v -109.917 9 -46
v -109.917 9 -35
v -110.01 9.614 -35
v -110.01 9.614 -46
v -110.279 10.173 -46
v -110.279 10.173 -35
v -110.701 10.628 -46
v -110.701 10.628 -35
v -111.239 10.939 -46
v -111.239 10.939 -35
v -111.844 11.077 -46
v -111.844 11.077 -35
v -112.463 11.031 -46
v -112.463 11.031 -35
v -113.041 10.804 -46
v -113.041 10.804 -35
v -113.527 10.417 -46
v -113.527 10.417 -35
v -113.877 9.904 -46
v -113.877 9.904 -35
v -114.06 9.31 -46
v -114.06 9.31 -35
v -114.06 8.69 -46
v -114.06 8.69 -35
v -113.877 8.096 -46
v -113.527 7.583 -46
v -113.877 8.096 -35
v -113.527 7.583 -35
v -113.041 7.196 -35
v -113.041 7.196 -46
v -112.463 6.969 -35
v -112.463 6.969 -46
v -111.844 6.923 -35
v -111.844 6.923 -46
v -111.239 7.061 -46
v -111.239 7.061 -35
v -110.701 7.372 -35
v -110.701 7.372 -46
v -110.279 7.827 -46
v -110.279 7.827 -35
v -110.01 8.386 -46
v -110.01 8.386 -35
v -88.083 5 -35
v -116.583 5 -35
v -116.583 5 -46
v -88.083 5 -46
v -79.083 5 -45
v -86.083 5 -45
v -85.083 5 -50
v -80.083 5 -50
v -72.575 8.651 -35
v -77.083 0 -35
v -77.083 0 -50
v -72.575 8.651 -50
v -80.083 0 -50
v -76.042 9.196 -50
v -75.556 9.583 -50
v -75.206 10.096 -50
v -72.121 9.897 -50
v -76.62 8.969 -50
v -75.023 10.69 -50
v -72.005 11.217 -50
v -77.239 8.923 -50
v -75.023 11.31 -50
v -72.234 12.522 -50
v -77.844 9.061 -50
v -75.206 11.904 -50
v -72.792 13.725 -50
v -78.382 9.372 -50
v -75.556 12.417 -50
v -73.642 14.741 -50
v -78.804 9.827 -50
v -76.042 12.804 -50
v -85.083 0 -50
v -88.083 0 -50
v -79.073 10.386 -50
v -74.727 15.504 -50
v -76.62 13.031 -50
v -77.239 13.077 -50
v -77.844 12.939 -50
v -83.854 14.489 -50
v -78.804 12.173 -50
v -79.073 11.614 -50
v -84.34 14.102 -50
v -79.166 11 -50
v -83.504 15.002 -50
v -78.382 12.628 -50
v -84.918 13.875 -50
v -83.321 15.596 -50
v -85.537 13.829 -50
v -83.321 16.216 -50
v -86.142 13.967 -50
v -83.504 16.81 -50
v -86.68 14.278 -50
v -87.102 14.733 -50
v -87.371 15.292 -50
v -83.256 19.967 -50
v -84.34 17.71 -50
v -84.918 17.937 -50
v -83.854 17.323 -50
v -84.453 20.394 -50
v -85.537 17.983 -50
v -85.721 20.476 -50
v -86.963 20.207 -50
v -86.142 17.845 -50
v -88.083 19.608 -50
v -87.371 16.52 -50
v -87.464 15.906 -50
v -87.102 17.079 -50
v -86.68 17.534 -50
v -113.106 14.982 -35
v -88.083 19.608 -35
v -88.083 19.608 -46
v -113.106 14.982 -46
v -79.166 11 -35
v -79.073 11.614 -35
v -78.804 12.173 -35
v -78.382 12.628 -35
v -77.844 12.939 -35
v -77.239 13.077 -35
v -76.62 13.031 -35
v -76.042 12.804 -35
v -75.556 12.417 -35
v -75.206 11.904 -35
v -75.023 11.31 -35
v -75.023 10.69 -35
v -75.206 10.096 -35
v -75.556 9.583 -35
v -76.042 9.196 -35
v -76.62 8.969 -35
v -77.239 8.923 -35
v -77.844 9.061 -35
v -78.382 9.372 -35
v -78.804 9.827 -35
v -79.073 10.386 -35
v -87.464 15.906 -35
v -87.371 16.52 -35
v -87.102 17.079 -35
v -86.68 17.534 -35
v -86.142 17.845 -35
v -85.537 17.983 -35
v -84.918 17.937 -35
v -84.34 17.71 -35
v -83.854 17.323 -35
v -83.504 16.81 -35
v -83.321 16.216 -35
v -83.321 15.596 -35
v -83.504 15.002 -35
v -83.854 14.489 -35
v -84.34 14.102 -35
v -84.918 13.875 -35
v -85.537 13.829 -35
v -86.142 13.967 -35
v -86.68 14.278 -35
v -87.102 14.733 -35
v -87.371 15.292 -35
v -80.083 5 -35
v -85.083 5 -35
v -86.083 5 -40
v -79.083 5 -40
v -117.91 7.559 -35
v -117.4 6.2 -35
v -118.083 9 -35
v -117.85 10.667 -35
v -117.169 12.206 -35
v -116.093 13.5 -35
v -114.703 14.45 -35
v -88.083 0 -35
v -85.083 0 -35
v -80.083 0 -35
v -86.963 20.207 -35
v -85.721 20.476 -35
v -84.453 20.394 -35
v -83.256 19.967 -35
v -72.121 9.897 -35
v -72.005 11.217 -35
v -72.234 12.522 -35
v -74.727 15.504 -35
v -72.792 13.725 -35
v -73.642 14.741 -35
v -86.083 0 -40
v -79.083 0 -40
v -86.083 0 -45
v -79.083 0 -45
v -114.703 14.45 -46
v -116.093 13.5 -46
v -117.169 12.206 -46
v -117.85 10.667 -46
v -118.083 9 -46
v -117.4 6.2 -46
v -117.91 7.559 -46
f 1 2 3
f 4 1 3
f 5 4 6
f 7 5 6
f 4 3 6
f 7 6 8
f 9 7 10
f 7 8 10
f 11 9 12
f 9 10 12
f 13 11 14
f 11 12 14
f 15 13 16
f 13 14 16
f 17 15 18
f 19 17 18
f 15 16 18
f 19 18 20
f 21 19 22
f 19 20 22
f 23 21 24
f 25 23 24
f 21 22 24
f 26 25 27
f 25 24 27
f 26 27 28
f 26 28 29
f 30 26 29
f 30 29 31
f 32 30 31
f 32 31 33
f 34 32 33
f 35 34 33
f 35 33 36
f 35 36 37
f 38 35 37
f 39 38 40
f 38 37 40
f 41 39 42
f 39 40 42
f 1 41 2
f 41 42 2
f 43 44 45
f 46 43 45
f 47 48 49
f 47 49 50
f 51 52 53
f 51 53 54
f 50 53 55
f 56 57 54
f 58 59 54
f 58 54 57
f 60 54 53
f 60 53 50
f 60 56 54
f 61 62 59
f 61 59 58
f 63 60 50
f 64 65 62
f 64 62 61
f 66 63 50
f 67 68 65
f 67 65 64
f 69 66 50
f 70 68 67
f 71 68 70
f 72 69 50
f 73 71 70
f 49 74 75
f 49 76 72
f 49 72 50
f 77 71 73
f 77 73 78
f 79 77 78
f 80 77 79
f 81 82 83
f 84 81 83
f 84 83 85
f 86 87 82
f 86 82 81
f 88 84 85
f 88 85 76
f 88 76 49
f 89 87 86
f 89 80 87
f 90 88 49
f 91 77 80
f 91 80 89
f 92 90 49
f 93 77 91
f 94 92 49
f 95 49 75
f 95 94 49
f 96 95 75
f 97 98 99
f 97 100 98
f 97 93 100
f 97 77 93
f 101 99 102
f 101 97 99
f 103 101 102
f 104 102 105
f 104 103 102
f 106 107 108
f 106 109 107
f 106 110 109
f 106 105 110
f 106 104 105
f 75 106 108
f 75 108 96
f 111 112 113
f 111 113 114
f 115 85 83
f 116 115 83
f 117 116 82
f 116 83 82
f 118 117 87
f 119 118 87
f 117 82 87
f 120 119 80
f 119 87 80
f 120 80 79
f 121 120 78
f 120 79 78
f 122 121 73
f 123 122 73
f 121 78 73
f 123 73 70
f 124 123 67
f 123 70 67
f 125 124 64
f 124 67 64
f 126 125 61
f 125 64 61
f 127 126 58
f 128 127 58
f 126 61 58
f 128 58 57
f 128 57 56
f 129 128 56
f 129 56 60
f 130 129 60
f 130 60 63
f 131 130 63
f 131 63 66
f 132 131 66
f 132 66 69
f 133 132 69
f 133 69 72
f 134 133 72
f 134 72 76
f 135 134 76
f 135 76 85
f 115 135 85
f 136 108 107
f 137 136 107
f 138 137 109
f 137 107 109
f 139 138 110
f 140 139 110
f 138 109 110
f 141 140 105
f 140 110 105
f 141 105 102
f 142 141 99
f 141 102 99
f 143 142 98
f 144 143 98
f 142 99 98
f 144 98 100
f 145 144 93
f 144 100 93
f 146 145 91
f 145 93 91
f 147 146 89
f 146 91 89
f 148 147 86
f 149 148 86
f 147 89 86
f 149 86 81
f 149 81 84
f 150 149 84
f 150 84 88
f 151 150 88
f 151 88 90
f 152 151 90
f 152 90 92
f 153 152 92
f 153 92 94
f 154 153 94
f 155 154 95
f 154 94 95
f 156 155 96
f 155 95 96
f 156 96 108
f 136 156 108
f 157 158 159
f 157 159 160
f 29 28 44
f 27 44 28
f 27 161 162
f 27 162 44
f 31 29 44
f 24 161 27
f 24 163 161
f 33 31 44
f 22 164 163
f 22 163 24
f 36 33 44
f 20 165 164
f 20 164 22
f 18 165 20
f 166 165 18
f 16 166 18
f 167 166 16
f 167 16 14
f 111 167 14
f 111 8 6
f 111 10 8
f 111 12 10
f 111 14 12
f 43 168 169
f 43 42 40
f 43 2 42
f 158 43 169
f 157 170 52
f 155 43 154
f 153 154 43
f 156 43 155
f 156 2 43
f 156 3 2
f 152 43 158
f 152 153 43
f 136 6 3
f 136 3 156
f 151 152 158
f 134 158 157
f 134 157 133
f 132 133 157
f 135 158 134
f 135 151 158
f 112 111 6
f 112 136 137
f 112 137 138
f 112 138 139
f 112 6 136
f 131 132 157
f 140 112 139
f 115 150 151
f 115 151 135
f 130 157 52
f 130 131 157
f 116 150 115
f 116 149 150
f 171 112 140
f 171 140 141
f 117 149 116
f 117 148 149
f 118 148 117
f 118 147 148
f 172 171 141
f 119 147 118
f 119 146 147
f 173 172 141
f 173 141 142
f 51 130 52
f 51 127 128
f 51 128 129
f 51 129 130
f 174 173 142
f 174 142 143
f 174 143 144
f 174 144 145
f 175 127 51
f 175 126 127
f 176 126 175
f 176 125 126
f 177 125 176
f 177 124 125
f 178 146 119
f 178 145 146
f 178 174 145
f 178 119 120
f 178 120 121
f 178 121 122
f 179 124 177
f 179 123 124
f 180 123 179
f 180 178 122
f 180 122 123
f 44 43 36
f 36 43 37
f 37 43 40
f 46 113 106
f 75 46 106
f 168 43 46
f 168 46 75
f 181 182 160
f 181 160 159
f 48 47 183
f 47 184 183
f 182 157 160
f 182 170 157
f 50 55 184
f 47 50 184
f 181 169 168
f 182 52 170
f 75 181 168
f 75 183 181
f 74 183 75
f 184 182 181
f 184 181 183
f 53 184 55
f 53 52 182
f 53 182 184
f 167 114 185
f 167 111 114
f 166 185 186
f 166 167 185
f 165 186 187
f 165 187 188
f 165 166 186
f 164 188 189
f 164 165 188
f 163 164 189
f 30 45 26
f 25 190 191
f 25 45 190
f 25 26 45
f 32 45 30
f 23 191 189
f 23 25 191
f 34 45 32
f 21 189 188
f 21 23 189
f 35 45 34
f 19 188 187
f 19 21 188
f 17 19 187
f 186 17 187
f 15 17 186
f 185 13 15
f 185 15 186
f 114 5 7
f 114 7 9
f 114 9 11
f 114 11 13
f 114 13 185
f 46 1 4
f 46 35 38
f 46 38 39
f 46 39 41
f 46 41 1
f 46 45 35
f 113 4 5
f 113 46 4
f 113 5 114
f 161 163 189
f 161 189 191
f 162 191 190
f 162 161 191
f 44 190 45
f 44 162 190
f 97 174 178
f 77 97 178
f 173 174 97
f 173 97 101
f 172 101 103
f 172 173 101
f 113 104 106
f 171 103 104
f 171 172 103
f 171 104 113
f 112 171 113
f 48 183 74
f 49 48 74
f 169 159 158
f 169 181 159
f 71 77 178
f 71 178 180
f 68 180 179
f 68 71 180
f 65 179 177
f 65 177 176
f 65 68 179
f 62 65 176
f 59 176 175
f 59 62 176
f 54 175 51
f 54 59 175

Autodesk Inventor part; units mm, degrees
ref_plane "YZ Plane" through (0, 0, 0) normal (1, 0, 0) x (0, 1, 0)
ref_plane "XZ Plane" through (0, 0, 0) normal (0, 1, 0) x (-1, 0, 0)
ref_plane "XY Plane" through (0, 0, 0) normal (0, 0, 1) x (1, 0, 0)
sketch "Sketch1" plane through (0, 0, 0) normal (0, 1, 0) x (-1, 0, 0)
  line L0 (0, 0) -> (0, -35)
  line L1 (0, -35) -> (37, -35)
  line L2 (37, -35) -> (37, -55)
  line L3 (37, -55) -> (48, -55)
  line L4 (48, -55) -> (48, 0)
  line L5 (48, 0) -> (22, 0)
  line L6 (22, 0) -> (22, 0)
  line L7 (22, 0) -> (0, 0)
  dimension "d0" = 35
  dimension "d1" = 37
  dimension "d2" = 20
  dimension "d3" = 11
  dimension "d4" = 55
  dimension "d5" = 26
  dimension "d6" = 0
extrude "Extrusion1" add sketch "Sketch1" along normal blind 50
shell "Shell1" thickness 5 removed faces 3 at (-48, 16.6667, -36.6667) at (-19.6667, 0, -23.3333) at (-19.6667, 50, -23.3333)
sketch "Sketch2" plane through (0, 0, 0) normal (1, 0, 0) x (0, 0, -1)
  line L0 (5, 0) -> (30, 0) projected
  line L1 (5, 0) -> (19, 0)
  line L2 (19, 0) -> (19, 17)
  line L3 (19, 17) -> (5, 17)
  line L4 (5, 17) -> (5, 0)
  point P0 (0, 0)
  dimension "d10" = 17
  dimension "d11" = 0
  dimension "d12" = 11
extrude "Extrusion2" cut sketch "Sketch2" against normal blind 10
sketch "Sketch3" plane through (-48, 0, -55) normal (-1, 0, 0) x (0, 0, 1)
  line L0 (0, 0) -> (0, 50) projected
  line L1 (5, 50) -> (25, 50) projected
  line L2 (0, 0) -> (5, 0)
  line L3 (5, 0) -> (5, 50)
  line L4 (5, 50) -> (0, 50)
  line L5 (0, 50) -> (0, 0)
  point P0 (55, 0)
extrude "Extrusion3" add sketch "Sketch3" along normal blind 15
sketch "Sketch4" plane through (-48, 0, 0) normal (-1, 0, 0) x (0, 0, 1)
  line L0 (-5, 0) -> (0, 0) projected
  line L1 (-5, 0) -> (-5, 50) projected
  line L2 (0, 0) -> (-5, 0)
  line L3 (-5, 0) -> (-5, 50)
  line L4 (-5, 50) -> (0, 50)
  line L5 (0, 50) -> (0, 0)
  point P0 (0, 0)
extrude "Extrusion4" add sketch "Sketch4" along normal blind 15
sketch "Sketch5" plane through (0, 17, -5) normal (0, 0, -1) x (-1, 0, 0)
  circle A0 centre (11.5, -8.5) radius 2.0828
  line L0 (63, -17) -> (0, -17) projected
  line L1 (0, -17) -> (0, 0) projected
  dimension "d19" = 4.1656
  dimension "d20" = 8.5
  dimension "d21" = 11.5
extrude "Extrusion5" cut sketch "Sketch5" against normal blind 15
sketch "Sketch6" plane through (0, 17, -5) normal (0, 0, -1) x (-1, 0, 0)
  circle A0 centre (28.505, 18.46) radius 2.0828
  line L0 (63, -17) -> (0, -17) projected
  line L1 (5, 0) -> (5, 33) projected
  dimension "d24" = 4.1656
  dimension "d25" = 35.46
  dimension "d26" = 23.505
extrude "Extrusion6" cut sketch "Sketch6" against normal blind 15
sketch "Sketch7" plane through (0, 17, -5) normal (0, 0, -1) x (-1, 0, 0)
  circle A0 centre (58.5, 19) radius 2.0828
  line L0 (63, 33) -> (63, -17) projected
  line L1 (5, 33) -> (63, 33) projected
  point P0 (0, -17)
  dimension "d29" = 4.1656
  dimension "d30" = 4.5
  dimension "d31" = 14
extrude "Extrusion7" cut sketch "Sketch7" against normal blind 15
sketch "Sketch13" plane through (0, 0, -35) normal (0, 0, -1) x (-1, 0, 0)
  circle A0 centre (11.5, 8.5) radius 2.0828
  line L0 (0, 0) -> (37, 0) projected
  line L1 (0, 0) -> (0, 50) projected
  dimension "d41" = 4.1656
  dimension "d42" = 8.5
  dimension "d43" = 11.5
extrude "Extrusion9" cut sketch "Sketch13" against normal blind 15
sketch "Sketch14" plane through (-37, 0, -55) normal (0, 0, -1) x (-1, 0, 0)
  circle A0 centre (-8.495, 35.46) radius 2.0828
  line L0 (-37, 0) -> (-37, 50) projected
  line L1 (0, 0) -> (26, 0) projected
  dimension "d46" = 4.1656
  dimension "d47" = 28.505
  dimension "d48" = 35.46
extrude "Extrusion10" cut sketch "Sketch14" against normal blind 15
sketch "Sketch15" plane through (-37, 0, -55) normal (0, 0, -1) x (-1, 0, 0)
  circle A0 centre (21.5, 36) radius 2.0828
  line L0 (0, 0) -> (26, 0) projected
  line L1 (26, 50) -> (26, 0) projected
  point P0 (-37, 0)
  dimension "d51" = 4.1656
  dimension "d52" = 36
  dimension "d53" = 4.5
extrude "Extrusion11" cut sketch "Sketch15" against normal blind 15
sketch "Sketch16" plane through (-42, 0, -30) normal (-1, 0, 0) x (0, 0, 1)
  line L0 (0, 0) -> (-5, 0)
  line L1 (-5, 0) -> (-5, 50)
  line L2 (-5, 50) -> (0, 50)
  line L3 (0, 50) -> (0, 0)
  point P0 (30, 0)
  dimension "d56" = 5
  dimension "d57" = 50
extrude "Extrusion12" add sketch "Sketch16" along normal blind 21
sketch "Sketch17" plane through (-5, 0, -30) normal (0, 0, 1) x (1, 0, 0)
  circle A0 centre (-23.505, 35.46) radius 2.0828
  line L0 (0, 0) -> (0, 50) projected
  line L1 (0, 0) -> (-58, 0) projected
  point P0 (5, 0)
  dimension "d60" = 4.1656
  dimension "d61" = 23.505
  dimension "d62" = 35.46
extrude "Extrusion13" cut sketch "Sketch17" against normal blind 10
sketch "Sketch18" plane through (-42, 0, -35) normal (0, 0, -1) x (-1, 0, 0)
  circle A0 centre (16.5, 36) radius 2.0828
  line L0 (21, 50) -> (21, 0) projected
  line L1 (0, 0) -> (21, 0) projected
  point P0 (-42, 0)
  dimension "d65" = 4.1656
  dimension "d67" = 36
  dimension "d70" = 4.5
extrude "Extrusion14" cut sketch "Sketch18" against normal blind 10
sketch "Sketch20" plane through (-63, 0, 0) normal (-1, 0, 0) x (0, 0, 1)
  line L0 (0, 0) -> (-5, 0) projected
  line L1 (-5, 17) -> (-5, 50) projected
  line L2 (0, 0) -> (-5, 0)
  line L3 (-5, 0) -> (-5, 50)
  line L4 (-5, 50) -> (0, 50)
  line L5 (0, 50) -> (0, 0)
extrude "Extrusion15" add sketch "Sketch20" along normal blind 2.583
sketch "Sketch21" plane through (-63, 0, -30) normal (-1, 0, 0) x (0, 0, 1)
  line L0 (-20, 50) -> (-5, 50) projected
  line L1 (11, 0) -> (0, 0) projected
  line L2 (-5, 50) -> (0, 50)
  line L3 (0, 50) -> (0, 0)
  line L4 (0, 0) -> (-5, 0)
  line L5 (-5, 0) -> (-5, 50)
  point P0 (30, 0)
extrude "Extrusion16" add sketch "Sketch21" along normal blind 2.583
sketch "Sketch22" plane through (-63, 0, -55) normal (-1, 0, 0) x (0, 0, 1)
  line L0 (0, 0) -> (0, 50) projected
  line L1 (5, 0) -> (5, 50) projected
  line L2 (0, 50) -> (5, 50)
  line L3 (5, 50) -> (5, 0)
  line L4 (5, 0) -> (0, 0)
  line L5 (0, 0) -> (0, 50)
  point P0 (55, 0)
extrude "Extrusion17" add sketch "Sketch22" along normal blind 2.583
sketch "Sketch23" plane through (0, 0, 0) normal (0, 0, 1) x (1, 0, 0)
  line L0 (0, 50) -> (-37, 50) projected
  line L1 (-65.583, 50) -> (-65.583, 0) projected
  line L2 (0, 50) -> (-65.583, 50)
  line L3 (-65.583, 50) -> (-65.583, 43.083)
  line L4 (-65.583, 43.083) -> (0, 43.083)
  line L5 (0, 43.083) -> (0, 50)
  point P0 (0, 0)
  dimension "d77" = 6.917
extrude "Extrusion18" cut sketch "Sketch23" against normal blind 100
sketch "Sketch24" plane through (0, 0, -35) normal (0, 0, -1) x (-1, 0, 0)
  line L0 (0, 0) -> (65.583, 0) projected
  line L1 (31.0052, 0) -> (26.0052, 0)
  line L2 (26.0052, 5) -> (31.0052, 5)
  circle A0 centre (28.505, 35.46) radius 2.0828 projected
  line L3 (26.0052, 5) -> (25.0052, 5)
  line L4 (25.0052, 5) -> (26.0052, 0)
  line L5 (31.0052, 5) -> (32.0052, 5)
  line L6 (32.0052, 5) -> (31.0052, 0)
  dimension "d80" = 5
  dimension "d81" = 5
  dimension "d83" = 1
  dimension "d84" = 1
extrude "Extrusion19" cut sketch "Sketch24" against normal blind 100 contours L4 L3 L2 L5 L6 L0
sketch "Sketch25" plane through (-65.583, 0, -55) normal (-1, 0, 0) x (0, 0, 1)
  line L0 (20, 0) -> (0, 0) projected
  line L1 (0, 43.083) -> (20, 43.083) projected
  line L2 (0, 0) -> (5, 0)
  line L3 (5, 0) -> (5, 43.083)
  line L4 (5, 43.083) -> (0, 43.083)
  line L5 (0, 43.083) -> (0, 0)
  point P0 (55, 0)
  dimension "d87" = 5
extrude "Extrusion20" add sketch "Sketch25" along normal blind 22.5
sketch "Sketch28" plane through (-65.583, 0, -30) normal (-1, 0, 0) x (0, 0, 1)
  line L0 (0, 0) -> (-5, 0) projected
  line L1 (-5, 0) -> (-5, 43.083) projected
  line L2 (0, 0) -> (-5, 0)
  line L3 (-5, 0) -> (-5, 43.083)
  line L4 (-5, 43.083) -> (0, 43.083)
  line L5 (0, 43.083) -> (0, 0)
  point P0 (30, 0)
extrude "Extrusion23" add sketch "Sketch28" along normal blind 22.5
sketch "Sketch26" plane through (-37, 0, -55) normal (0, 0, -1) x (-1, 0, 0)
  circle A0 centre (45.232, 36.922) radius 2.0828
  line L0 (51.083, 43.083) -> (51.083, 0) projected
  line L1 (51.083, 43.083) -> (0, 43.083) projected
  point P0 (-37, 0)
  dimension "d90" = 4.1656
  dimension "d91" = 5.851
  dimension "d92" = 6.161
extrude "Extrusion21" cut sketch "Sketch26" against normal blind 25
sketch "Sketch27" plane through (-37, 0, -55) normal (0, 0, -1) x (-1, 0, 0)
  circle A0 centre (48.381, 15.906) radius 2.0828
  line L0 (51.083, 43.083) -> (51.083, 0) projected
  line L1 (0, 0) -> (51.083, 0) projected
  point P0 (-37, 0)
  dimension "d95" = 4.1656
  dimension "d96" = 2.702
  dimension "d97" = 15.906
extrude "Extrusion22" cut sketch "Sketch27" against normal blind 25
sketch "Sketch29" plane through (-42, 0, -35) normal (0, 0, -1) x (-1, 0, 0)
  circle A0 centre (43.381, 15.906) radius 2.0828 projected
  arc A1 (46.083, 19.6075) -> (46.083, 12.2045) centre (43.381, 15.906) ccw
  line L0 (46.083, 43.083) -> (46.083, 0) projected
  line L1 (46.083, 19.6075) -> (46.083, 12.2045)
  point P0 (-42, 0)
  dimension "d102" = 2.5
extrude "Extrusion24" add sketch "Sketch29" along normal up to next
sketch "Sketch30" plane through (-88.083, 0, -55) normal (-1, 0, 0) x (0, 0, 1)
  line L0 (9, 19.6075) -> (20, 19.6075)
  line L1 (20, 19.6075) -> (20, 5)
  line L2 (20, 5) -> (9, 5)
  line L3 (9, 5) -> (9, 19.6075)
  line L4 (0, 43.083) -> (0, 0) projected
  line L5 (25, 0) -> (25, 43.083) projected
  line L6 (0, 0) -> (5, 0) projected
  line L7 (20, 19.6075) -> (5, 19.6075) projected
  point P0 (55, 0)
  dimension "d105" = 9
  dimension "d106" = 5
  dimension "d107" = 5
  dimension "d108" = 0
extrude "Extrusion25" add sketch "Sketch30" along normal blind 30
sketch "Sketch31" plane through (-88.083, 5, -35) normal (0, 0, 1) x (1, 0, 0)
  circle A0 centre (-23.917, 4) radius 2.0828
  line L0 (-30, 0) -> (-30, 14.6075) projected
  line L1 (0, 0) -> (-30, 0) projected
  point P0 (88.083, -5)
  dimension "d111" = 4.1656
  dimension "d112" = 6.083
  dimension "d113" = 4
extrude "Extrusion26" cut sketch "Sketch31" against normal blind 30
sketch "Sketch33" plane through (-88.083, 5, -35) normal (0, 0, 1) x (1, 0, 0)
  circle A0 centre (-23.917, 4) radius 2.0828 projected
  arc A1 (-25.0228, 9.9816) -> (-30, 4) centre (-23.917, 4) ccw
  line L0 (-30, 14.6075) -> (-30, 0) projected
  line L1 (-30, 0) -> (-30, 14.6075) projected
  line L2 (0, 14.6075) -> (-30, 14.6075) projected
  line L3 (-30, 4) -> (-30, 14.6075)
  line L4 (0, 14.6075) -> (-30, 14.6075) projected
  line L5 (-30, 14.6075) -> (0, 14.6075)
  line L6 (0, 14.6075) -> (-25.0228, 9.9816)
  point P0 (88.083, -5)
extrude "Extrusion27" cut sketch "Sketch33" against normal blind 30 contours A1 L0 L2 L6
sketch "Sketch34" plane through (-118.083, 5, -35) normal (0, 0, 1) x (1, 0, 0)
  circle A0 centre (6.083, 4) radius 2.0828 projected
  line L0 (0, 0) -> (0, 4) projected
  arc A1 (0, 4) -> (1.5001, 0) centre (6.083, 4) ccw
  line L1 (30, 0) -> (0, 0) projected
  line L2 (1.5001, 0) -> (0, 0)
  arc A2 (4.9772, 9.9816) -> (0, 4) centre (6.083, 4) ccw projected
  line L3 (0, 0) -> (0, 4)
  point P0 (118.083, -5)
extrude "Extrusion28" cut sketch "Sketch34" against normal blind 30 contours L0 A1 L1
sketch "Sketch35" plane through (-88.083, 5, -46) normal (0, -1, 0) x (1, 0, 0)
  line L0 (0, 0) -> (-28.4999, 0) projected
  line L1 (46.083, 11) -> (0, 11) projected
  line L2 (0, 11) -> (11, 11)
  line L3 (11, 11) -> (11, -4)
  line L4 (11, -4) -> (0, -4)
  line L5 (0, -4) -> (0, 11)
  point P0 (88.083, 46)
  dimension "d130" = 11
  dimension "d131" = 15
  dimension "d132" = 0
  dimension "d133" = 0
extrude "Extrusion29" add sketch "Sketch35" against normal blind 8 and the other way blind 5
sketch "Sketch39" plane through (0, 0, 0) normal (1, 0, 0) x (0, 0, -1)
  line L0 (0, 0) -> (5, 0) projected
  line L1 (35, 43.083) -> (0, 43.083) projected
  line L2 (0, 0) -> (35, 0)
  line L3 (35, 0) -> (35, 43.083)
  line L4 (35, 43.083) -> (0, 43.083)
  line L5 (0, 43.083) -> (0, 0)
extrude "Extrusion30" cut sketch "Sketch39" against normal blind 190
sketch "Sketch40" plane through (-37, 0, -55) normal (0, 0, -1) x (-1, 0, 0)
  line L0 (29.4244, -3.1435) -> (-8.7081, -3.1435)
  line L1 (-8.7081, -3.1435) -> (-8.7081, 47.1531)
  line L2 (-8.7081, 47.1531) -> (29.4244, 47.1531)
  line L3 (29.4244, 47.1531) -> (29.4244, -3.1435)
  point P0 (-37, 0)
extrude "Extrusion31" cut sketch "Sketch40" against normal blind 50
sketch "Sketch41" plane through (-66.4244, 0, -55) normal (1, 0, 0) x (0, 0, -1)
  line L0 (0, 0) -> (-5, 0) projected
  line L1 (-5, 0) -> (13.4745, 0)
  line L2 (13.4745, 0) -> (13.4745, 44.4196)
  line L3 (13.4745, 44.4196) -> (-5, 44.4196)
  line L4 (-5, 44.4196) -> (-5, 0)
  point P0 (-55, 0)
extrude "Extrusion32" cut sketch "Sketch41" against normal blind 50
sketch "Sketch42" plane through (-88.083, 0, -35) normal (0, 0, 1) x (1, 0, 0)
  line L0 (11, 13) -> (6.2456, 13) projected
  line L1 (11, 13) -> (6.2456, 18.812)
  arc A0 (6.2456, 13) -> (0, 19.6075) centre (2.702, 15.906) ccw projected
  line L2 (6.2456, 13) -> (6.2456, 18.812)
  line L3 (6.2456, 13) -> (11, 13)
  point P0 (88.083, 0)
extrude "Extrusion33" add sketch "Sketch42" against normal blind 15
sketch "Sketch43" plane through (0, 0, 0) normal (0, -1, 0) x (1, 0, 0)
  line L0 (-88.083, -50) -> (-77.083, -50) projected
  line L1 (-80.083, -50) -> (-79.083, -45)
  line L2 (-79.083, -45) -> (-86.083, -45)
  line L3 (-86.083, -45) -> (-85.083, -50)
  line L4 (-80.083, -50) -> (-85.083, -50)
  line L5 (-77.083, -50) -> (-77.083, -35) projected
  line L6 (-88.083, -50) -> (-88.083, -35) projected
  point P0 (0, 0)
  dimension "d144" = 3
  dimension "d145" = 3
  dimension "d146" = 5
  dimension "d147" = 1
  dimension "d148" = 1
extrude "Extrusion34" cut sketch "Sketch43" against normal blind 5
sketch "Sketch44" plane through (0, 0, 0) normal (0, -1, 0) x (1, 0, 0)
  line L0 (-77.083, -35) -> (-88.083, -35) projected
  line L1 (-80.083, -35) -> (-79.083, -40)
  line L2 (-79.083, -40) -> (-86.083, -40)
  line L3 (-86.083, -40) -> (-85.083, -35)
  line L4 (-85.083, -35) -> (-80.083, -35)
  line L5 (-77.083, -50) -> (-77.083, -35) projected
  line L6 (-88.083, -50) -> (-88.083, -35) projected
  point P0 (0, 0)
  dimension "d151" = 3
  dimension "d152" = 1
  dimension "d153" = 3
  dimension "d154" = 1
  dimension "d155" = 5
extrude "Extrusion35" cut sketch "Sketch44" against normal blind 5
sketch "Sketch45" plane through (-88.083, 0, -50) normal (0, 0, -1) x (-1, 0, 0)
  line L0 (0, 0) -> (0, 5) construction
  line L1 (0, 0) -> (-16.9719, 16.9719) construction
  line L2 (0, 0) -> (24.0019, 0) construction
  line L3 (-11, 0) -> (-11, 13) projected
  circle A0 centre (-11, 11) radius 2.0828
  point P0 (-88.083, 0)
  dimension "d158" = 135
  dimension "d159" = 4.1656
extrude "Extrusion36" cut sketch "Sketch45" against normal blind 15
sketch "Sketch47" plane through (-88.083, 0, -50) normal (0, 0, -1) x (-1, 0, 0)
  arc A0 (-11, 8.9172) -> (-10.9331, 13.0817) centre (-11, 11) ccw projected
  arc A1 (0, 19.6075) -> (-6.2456, 18.812) centre (-2.702, 15.906) ccw projected
  line L0 (-4.8266, 19.9666) -> (-13.3564, 15.5036)
  line L1 (-11, 8.9172) -> (-11, 0) projected
  line L2 (-11, 0) -> (-15.5076, 8.6514)
  line L3 (-11, 0) -> (-4.8266, 19.9666)
  arc A2 (-13.3564, 15.5036) -> (-15.5076, 8.6514) centre (-11, 11) ccw
  point P0 (-88.083, 0)
extrude "Extrusion37" add sketch "Sketch47" against normal blind 15
sketch "Sketch48" plane through (-88.083, 0, -50) normal (0, 0, -1) x (-1, 0, 0)
  circle A0 centre (-11, 11) radius 2.0828
  arc A1 (-13.3564, 15.5036) -> (-15.5076, 8.6514) centre (-11, 11) ccw projected
  point P0 (-88.083, 0)
  dimension "d165" = 4.1656
  dimension "d166" = 0
  dimension "d167" = 0
extrude "Extrusion38" cut sketch "Sketch48" against normal blind 15
properties part number "Frame VG01-07"
